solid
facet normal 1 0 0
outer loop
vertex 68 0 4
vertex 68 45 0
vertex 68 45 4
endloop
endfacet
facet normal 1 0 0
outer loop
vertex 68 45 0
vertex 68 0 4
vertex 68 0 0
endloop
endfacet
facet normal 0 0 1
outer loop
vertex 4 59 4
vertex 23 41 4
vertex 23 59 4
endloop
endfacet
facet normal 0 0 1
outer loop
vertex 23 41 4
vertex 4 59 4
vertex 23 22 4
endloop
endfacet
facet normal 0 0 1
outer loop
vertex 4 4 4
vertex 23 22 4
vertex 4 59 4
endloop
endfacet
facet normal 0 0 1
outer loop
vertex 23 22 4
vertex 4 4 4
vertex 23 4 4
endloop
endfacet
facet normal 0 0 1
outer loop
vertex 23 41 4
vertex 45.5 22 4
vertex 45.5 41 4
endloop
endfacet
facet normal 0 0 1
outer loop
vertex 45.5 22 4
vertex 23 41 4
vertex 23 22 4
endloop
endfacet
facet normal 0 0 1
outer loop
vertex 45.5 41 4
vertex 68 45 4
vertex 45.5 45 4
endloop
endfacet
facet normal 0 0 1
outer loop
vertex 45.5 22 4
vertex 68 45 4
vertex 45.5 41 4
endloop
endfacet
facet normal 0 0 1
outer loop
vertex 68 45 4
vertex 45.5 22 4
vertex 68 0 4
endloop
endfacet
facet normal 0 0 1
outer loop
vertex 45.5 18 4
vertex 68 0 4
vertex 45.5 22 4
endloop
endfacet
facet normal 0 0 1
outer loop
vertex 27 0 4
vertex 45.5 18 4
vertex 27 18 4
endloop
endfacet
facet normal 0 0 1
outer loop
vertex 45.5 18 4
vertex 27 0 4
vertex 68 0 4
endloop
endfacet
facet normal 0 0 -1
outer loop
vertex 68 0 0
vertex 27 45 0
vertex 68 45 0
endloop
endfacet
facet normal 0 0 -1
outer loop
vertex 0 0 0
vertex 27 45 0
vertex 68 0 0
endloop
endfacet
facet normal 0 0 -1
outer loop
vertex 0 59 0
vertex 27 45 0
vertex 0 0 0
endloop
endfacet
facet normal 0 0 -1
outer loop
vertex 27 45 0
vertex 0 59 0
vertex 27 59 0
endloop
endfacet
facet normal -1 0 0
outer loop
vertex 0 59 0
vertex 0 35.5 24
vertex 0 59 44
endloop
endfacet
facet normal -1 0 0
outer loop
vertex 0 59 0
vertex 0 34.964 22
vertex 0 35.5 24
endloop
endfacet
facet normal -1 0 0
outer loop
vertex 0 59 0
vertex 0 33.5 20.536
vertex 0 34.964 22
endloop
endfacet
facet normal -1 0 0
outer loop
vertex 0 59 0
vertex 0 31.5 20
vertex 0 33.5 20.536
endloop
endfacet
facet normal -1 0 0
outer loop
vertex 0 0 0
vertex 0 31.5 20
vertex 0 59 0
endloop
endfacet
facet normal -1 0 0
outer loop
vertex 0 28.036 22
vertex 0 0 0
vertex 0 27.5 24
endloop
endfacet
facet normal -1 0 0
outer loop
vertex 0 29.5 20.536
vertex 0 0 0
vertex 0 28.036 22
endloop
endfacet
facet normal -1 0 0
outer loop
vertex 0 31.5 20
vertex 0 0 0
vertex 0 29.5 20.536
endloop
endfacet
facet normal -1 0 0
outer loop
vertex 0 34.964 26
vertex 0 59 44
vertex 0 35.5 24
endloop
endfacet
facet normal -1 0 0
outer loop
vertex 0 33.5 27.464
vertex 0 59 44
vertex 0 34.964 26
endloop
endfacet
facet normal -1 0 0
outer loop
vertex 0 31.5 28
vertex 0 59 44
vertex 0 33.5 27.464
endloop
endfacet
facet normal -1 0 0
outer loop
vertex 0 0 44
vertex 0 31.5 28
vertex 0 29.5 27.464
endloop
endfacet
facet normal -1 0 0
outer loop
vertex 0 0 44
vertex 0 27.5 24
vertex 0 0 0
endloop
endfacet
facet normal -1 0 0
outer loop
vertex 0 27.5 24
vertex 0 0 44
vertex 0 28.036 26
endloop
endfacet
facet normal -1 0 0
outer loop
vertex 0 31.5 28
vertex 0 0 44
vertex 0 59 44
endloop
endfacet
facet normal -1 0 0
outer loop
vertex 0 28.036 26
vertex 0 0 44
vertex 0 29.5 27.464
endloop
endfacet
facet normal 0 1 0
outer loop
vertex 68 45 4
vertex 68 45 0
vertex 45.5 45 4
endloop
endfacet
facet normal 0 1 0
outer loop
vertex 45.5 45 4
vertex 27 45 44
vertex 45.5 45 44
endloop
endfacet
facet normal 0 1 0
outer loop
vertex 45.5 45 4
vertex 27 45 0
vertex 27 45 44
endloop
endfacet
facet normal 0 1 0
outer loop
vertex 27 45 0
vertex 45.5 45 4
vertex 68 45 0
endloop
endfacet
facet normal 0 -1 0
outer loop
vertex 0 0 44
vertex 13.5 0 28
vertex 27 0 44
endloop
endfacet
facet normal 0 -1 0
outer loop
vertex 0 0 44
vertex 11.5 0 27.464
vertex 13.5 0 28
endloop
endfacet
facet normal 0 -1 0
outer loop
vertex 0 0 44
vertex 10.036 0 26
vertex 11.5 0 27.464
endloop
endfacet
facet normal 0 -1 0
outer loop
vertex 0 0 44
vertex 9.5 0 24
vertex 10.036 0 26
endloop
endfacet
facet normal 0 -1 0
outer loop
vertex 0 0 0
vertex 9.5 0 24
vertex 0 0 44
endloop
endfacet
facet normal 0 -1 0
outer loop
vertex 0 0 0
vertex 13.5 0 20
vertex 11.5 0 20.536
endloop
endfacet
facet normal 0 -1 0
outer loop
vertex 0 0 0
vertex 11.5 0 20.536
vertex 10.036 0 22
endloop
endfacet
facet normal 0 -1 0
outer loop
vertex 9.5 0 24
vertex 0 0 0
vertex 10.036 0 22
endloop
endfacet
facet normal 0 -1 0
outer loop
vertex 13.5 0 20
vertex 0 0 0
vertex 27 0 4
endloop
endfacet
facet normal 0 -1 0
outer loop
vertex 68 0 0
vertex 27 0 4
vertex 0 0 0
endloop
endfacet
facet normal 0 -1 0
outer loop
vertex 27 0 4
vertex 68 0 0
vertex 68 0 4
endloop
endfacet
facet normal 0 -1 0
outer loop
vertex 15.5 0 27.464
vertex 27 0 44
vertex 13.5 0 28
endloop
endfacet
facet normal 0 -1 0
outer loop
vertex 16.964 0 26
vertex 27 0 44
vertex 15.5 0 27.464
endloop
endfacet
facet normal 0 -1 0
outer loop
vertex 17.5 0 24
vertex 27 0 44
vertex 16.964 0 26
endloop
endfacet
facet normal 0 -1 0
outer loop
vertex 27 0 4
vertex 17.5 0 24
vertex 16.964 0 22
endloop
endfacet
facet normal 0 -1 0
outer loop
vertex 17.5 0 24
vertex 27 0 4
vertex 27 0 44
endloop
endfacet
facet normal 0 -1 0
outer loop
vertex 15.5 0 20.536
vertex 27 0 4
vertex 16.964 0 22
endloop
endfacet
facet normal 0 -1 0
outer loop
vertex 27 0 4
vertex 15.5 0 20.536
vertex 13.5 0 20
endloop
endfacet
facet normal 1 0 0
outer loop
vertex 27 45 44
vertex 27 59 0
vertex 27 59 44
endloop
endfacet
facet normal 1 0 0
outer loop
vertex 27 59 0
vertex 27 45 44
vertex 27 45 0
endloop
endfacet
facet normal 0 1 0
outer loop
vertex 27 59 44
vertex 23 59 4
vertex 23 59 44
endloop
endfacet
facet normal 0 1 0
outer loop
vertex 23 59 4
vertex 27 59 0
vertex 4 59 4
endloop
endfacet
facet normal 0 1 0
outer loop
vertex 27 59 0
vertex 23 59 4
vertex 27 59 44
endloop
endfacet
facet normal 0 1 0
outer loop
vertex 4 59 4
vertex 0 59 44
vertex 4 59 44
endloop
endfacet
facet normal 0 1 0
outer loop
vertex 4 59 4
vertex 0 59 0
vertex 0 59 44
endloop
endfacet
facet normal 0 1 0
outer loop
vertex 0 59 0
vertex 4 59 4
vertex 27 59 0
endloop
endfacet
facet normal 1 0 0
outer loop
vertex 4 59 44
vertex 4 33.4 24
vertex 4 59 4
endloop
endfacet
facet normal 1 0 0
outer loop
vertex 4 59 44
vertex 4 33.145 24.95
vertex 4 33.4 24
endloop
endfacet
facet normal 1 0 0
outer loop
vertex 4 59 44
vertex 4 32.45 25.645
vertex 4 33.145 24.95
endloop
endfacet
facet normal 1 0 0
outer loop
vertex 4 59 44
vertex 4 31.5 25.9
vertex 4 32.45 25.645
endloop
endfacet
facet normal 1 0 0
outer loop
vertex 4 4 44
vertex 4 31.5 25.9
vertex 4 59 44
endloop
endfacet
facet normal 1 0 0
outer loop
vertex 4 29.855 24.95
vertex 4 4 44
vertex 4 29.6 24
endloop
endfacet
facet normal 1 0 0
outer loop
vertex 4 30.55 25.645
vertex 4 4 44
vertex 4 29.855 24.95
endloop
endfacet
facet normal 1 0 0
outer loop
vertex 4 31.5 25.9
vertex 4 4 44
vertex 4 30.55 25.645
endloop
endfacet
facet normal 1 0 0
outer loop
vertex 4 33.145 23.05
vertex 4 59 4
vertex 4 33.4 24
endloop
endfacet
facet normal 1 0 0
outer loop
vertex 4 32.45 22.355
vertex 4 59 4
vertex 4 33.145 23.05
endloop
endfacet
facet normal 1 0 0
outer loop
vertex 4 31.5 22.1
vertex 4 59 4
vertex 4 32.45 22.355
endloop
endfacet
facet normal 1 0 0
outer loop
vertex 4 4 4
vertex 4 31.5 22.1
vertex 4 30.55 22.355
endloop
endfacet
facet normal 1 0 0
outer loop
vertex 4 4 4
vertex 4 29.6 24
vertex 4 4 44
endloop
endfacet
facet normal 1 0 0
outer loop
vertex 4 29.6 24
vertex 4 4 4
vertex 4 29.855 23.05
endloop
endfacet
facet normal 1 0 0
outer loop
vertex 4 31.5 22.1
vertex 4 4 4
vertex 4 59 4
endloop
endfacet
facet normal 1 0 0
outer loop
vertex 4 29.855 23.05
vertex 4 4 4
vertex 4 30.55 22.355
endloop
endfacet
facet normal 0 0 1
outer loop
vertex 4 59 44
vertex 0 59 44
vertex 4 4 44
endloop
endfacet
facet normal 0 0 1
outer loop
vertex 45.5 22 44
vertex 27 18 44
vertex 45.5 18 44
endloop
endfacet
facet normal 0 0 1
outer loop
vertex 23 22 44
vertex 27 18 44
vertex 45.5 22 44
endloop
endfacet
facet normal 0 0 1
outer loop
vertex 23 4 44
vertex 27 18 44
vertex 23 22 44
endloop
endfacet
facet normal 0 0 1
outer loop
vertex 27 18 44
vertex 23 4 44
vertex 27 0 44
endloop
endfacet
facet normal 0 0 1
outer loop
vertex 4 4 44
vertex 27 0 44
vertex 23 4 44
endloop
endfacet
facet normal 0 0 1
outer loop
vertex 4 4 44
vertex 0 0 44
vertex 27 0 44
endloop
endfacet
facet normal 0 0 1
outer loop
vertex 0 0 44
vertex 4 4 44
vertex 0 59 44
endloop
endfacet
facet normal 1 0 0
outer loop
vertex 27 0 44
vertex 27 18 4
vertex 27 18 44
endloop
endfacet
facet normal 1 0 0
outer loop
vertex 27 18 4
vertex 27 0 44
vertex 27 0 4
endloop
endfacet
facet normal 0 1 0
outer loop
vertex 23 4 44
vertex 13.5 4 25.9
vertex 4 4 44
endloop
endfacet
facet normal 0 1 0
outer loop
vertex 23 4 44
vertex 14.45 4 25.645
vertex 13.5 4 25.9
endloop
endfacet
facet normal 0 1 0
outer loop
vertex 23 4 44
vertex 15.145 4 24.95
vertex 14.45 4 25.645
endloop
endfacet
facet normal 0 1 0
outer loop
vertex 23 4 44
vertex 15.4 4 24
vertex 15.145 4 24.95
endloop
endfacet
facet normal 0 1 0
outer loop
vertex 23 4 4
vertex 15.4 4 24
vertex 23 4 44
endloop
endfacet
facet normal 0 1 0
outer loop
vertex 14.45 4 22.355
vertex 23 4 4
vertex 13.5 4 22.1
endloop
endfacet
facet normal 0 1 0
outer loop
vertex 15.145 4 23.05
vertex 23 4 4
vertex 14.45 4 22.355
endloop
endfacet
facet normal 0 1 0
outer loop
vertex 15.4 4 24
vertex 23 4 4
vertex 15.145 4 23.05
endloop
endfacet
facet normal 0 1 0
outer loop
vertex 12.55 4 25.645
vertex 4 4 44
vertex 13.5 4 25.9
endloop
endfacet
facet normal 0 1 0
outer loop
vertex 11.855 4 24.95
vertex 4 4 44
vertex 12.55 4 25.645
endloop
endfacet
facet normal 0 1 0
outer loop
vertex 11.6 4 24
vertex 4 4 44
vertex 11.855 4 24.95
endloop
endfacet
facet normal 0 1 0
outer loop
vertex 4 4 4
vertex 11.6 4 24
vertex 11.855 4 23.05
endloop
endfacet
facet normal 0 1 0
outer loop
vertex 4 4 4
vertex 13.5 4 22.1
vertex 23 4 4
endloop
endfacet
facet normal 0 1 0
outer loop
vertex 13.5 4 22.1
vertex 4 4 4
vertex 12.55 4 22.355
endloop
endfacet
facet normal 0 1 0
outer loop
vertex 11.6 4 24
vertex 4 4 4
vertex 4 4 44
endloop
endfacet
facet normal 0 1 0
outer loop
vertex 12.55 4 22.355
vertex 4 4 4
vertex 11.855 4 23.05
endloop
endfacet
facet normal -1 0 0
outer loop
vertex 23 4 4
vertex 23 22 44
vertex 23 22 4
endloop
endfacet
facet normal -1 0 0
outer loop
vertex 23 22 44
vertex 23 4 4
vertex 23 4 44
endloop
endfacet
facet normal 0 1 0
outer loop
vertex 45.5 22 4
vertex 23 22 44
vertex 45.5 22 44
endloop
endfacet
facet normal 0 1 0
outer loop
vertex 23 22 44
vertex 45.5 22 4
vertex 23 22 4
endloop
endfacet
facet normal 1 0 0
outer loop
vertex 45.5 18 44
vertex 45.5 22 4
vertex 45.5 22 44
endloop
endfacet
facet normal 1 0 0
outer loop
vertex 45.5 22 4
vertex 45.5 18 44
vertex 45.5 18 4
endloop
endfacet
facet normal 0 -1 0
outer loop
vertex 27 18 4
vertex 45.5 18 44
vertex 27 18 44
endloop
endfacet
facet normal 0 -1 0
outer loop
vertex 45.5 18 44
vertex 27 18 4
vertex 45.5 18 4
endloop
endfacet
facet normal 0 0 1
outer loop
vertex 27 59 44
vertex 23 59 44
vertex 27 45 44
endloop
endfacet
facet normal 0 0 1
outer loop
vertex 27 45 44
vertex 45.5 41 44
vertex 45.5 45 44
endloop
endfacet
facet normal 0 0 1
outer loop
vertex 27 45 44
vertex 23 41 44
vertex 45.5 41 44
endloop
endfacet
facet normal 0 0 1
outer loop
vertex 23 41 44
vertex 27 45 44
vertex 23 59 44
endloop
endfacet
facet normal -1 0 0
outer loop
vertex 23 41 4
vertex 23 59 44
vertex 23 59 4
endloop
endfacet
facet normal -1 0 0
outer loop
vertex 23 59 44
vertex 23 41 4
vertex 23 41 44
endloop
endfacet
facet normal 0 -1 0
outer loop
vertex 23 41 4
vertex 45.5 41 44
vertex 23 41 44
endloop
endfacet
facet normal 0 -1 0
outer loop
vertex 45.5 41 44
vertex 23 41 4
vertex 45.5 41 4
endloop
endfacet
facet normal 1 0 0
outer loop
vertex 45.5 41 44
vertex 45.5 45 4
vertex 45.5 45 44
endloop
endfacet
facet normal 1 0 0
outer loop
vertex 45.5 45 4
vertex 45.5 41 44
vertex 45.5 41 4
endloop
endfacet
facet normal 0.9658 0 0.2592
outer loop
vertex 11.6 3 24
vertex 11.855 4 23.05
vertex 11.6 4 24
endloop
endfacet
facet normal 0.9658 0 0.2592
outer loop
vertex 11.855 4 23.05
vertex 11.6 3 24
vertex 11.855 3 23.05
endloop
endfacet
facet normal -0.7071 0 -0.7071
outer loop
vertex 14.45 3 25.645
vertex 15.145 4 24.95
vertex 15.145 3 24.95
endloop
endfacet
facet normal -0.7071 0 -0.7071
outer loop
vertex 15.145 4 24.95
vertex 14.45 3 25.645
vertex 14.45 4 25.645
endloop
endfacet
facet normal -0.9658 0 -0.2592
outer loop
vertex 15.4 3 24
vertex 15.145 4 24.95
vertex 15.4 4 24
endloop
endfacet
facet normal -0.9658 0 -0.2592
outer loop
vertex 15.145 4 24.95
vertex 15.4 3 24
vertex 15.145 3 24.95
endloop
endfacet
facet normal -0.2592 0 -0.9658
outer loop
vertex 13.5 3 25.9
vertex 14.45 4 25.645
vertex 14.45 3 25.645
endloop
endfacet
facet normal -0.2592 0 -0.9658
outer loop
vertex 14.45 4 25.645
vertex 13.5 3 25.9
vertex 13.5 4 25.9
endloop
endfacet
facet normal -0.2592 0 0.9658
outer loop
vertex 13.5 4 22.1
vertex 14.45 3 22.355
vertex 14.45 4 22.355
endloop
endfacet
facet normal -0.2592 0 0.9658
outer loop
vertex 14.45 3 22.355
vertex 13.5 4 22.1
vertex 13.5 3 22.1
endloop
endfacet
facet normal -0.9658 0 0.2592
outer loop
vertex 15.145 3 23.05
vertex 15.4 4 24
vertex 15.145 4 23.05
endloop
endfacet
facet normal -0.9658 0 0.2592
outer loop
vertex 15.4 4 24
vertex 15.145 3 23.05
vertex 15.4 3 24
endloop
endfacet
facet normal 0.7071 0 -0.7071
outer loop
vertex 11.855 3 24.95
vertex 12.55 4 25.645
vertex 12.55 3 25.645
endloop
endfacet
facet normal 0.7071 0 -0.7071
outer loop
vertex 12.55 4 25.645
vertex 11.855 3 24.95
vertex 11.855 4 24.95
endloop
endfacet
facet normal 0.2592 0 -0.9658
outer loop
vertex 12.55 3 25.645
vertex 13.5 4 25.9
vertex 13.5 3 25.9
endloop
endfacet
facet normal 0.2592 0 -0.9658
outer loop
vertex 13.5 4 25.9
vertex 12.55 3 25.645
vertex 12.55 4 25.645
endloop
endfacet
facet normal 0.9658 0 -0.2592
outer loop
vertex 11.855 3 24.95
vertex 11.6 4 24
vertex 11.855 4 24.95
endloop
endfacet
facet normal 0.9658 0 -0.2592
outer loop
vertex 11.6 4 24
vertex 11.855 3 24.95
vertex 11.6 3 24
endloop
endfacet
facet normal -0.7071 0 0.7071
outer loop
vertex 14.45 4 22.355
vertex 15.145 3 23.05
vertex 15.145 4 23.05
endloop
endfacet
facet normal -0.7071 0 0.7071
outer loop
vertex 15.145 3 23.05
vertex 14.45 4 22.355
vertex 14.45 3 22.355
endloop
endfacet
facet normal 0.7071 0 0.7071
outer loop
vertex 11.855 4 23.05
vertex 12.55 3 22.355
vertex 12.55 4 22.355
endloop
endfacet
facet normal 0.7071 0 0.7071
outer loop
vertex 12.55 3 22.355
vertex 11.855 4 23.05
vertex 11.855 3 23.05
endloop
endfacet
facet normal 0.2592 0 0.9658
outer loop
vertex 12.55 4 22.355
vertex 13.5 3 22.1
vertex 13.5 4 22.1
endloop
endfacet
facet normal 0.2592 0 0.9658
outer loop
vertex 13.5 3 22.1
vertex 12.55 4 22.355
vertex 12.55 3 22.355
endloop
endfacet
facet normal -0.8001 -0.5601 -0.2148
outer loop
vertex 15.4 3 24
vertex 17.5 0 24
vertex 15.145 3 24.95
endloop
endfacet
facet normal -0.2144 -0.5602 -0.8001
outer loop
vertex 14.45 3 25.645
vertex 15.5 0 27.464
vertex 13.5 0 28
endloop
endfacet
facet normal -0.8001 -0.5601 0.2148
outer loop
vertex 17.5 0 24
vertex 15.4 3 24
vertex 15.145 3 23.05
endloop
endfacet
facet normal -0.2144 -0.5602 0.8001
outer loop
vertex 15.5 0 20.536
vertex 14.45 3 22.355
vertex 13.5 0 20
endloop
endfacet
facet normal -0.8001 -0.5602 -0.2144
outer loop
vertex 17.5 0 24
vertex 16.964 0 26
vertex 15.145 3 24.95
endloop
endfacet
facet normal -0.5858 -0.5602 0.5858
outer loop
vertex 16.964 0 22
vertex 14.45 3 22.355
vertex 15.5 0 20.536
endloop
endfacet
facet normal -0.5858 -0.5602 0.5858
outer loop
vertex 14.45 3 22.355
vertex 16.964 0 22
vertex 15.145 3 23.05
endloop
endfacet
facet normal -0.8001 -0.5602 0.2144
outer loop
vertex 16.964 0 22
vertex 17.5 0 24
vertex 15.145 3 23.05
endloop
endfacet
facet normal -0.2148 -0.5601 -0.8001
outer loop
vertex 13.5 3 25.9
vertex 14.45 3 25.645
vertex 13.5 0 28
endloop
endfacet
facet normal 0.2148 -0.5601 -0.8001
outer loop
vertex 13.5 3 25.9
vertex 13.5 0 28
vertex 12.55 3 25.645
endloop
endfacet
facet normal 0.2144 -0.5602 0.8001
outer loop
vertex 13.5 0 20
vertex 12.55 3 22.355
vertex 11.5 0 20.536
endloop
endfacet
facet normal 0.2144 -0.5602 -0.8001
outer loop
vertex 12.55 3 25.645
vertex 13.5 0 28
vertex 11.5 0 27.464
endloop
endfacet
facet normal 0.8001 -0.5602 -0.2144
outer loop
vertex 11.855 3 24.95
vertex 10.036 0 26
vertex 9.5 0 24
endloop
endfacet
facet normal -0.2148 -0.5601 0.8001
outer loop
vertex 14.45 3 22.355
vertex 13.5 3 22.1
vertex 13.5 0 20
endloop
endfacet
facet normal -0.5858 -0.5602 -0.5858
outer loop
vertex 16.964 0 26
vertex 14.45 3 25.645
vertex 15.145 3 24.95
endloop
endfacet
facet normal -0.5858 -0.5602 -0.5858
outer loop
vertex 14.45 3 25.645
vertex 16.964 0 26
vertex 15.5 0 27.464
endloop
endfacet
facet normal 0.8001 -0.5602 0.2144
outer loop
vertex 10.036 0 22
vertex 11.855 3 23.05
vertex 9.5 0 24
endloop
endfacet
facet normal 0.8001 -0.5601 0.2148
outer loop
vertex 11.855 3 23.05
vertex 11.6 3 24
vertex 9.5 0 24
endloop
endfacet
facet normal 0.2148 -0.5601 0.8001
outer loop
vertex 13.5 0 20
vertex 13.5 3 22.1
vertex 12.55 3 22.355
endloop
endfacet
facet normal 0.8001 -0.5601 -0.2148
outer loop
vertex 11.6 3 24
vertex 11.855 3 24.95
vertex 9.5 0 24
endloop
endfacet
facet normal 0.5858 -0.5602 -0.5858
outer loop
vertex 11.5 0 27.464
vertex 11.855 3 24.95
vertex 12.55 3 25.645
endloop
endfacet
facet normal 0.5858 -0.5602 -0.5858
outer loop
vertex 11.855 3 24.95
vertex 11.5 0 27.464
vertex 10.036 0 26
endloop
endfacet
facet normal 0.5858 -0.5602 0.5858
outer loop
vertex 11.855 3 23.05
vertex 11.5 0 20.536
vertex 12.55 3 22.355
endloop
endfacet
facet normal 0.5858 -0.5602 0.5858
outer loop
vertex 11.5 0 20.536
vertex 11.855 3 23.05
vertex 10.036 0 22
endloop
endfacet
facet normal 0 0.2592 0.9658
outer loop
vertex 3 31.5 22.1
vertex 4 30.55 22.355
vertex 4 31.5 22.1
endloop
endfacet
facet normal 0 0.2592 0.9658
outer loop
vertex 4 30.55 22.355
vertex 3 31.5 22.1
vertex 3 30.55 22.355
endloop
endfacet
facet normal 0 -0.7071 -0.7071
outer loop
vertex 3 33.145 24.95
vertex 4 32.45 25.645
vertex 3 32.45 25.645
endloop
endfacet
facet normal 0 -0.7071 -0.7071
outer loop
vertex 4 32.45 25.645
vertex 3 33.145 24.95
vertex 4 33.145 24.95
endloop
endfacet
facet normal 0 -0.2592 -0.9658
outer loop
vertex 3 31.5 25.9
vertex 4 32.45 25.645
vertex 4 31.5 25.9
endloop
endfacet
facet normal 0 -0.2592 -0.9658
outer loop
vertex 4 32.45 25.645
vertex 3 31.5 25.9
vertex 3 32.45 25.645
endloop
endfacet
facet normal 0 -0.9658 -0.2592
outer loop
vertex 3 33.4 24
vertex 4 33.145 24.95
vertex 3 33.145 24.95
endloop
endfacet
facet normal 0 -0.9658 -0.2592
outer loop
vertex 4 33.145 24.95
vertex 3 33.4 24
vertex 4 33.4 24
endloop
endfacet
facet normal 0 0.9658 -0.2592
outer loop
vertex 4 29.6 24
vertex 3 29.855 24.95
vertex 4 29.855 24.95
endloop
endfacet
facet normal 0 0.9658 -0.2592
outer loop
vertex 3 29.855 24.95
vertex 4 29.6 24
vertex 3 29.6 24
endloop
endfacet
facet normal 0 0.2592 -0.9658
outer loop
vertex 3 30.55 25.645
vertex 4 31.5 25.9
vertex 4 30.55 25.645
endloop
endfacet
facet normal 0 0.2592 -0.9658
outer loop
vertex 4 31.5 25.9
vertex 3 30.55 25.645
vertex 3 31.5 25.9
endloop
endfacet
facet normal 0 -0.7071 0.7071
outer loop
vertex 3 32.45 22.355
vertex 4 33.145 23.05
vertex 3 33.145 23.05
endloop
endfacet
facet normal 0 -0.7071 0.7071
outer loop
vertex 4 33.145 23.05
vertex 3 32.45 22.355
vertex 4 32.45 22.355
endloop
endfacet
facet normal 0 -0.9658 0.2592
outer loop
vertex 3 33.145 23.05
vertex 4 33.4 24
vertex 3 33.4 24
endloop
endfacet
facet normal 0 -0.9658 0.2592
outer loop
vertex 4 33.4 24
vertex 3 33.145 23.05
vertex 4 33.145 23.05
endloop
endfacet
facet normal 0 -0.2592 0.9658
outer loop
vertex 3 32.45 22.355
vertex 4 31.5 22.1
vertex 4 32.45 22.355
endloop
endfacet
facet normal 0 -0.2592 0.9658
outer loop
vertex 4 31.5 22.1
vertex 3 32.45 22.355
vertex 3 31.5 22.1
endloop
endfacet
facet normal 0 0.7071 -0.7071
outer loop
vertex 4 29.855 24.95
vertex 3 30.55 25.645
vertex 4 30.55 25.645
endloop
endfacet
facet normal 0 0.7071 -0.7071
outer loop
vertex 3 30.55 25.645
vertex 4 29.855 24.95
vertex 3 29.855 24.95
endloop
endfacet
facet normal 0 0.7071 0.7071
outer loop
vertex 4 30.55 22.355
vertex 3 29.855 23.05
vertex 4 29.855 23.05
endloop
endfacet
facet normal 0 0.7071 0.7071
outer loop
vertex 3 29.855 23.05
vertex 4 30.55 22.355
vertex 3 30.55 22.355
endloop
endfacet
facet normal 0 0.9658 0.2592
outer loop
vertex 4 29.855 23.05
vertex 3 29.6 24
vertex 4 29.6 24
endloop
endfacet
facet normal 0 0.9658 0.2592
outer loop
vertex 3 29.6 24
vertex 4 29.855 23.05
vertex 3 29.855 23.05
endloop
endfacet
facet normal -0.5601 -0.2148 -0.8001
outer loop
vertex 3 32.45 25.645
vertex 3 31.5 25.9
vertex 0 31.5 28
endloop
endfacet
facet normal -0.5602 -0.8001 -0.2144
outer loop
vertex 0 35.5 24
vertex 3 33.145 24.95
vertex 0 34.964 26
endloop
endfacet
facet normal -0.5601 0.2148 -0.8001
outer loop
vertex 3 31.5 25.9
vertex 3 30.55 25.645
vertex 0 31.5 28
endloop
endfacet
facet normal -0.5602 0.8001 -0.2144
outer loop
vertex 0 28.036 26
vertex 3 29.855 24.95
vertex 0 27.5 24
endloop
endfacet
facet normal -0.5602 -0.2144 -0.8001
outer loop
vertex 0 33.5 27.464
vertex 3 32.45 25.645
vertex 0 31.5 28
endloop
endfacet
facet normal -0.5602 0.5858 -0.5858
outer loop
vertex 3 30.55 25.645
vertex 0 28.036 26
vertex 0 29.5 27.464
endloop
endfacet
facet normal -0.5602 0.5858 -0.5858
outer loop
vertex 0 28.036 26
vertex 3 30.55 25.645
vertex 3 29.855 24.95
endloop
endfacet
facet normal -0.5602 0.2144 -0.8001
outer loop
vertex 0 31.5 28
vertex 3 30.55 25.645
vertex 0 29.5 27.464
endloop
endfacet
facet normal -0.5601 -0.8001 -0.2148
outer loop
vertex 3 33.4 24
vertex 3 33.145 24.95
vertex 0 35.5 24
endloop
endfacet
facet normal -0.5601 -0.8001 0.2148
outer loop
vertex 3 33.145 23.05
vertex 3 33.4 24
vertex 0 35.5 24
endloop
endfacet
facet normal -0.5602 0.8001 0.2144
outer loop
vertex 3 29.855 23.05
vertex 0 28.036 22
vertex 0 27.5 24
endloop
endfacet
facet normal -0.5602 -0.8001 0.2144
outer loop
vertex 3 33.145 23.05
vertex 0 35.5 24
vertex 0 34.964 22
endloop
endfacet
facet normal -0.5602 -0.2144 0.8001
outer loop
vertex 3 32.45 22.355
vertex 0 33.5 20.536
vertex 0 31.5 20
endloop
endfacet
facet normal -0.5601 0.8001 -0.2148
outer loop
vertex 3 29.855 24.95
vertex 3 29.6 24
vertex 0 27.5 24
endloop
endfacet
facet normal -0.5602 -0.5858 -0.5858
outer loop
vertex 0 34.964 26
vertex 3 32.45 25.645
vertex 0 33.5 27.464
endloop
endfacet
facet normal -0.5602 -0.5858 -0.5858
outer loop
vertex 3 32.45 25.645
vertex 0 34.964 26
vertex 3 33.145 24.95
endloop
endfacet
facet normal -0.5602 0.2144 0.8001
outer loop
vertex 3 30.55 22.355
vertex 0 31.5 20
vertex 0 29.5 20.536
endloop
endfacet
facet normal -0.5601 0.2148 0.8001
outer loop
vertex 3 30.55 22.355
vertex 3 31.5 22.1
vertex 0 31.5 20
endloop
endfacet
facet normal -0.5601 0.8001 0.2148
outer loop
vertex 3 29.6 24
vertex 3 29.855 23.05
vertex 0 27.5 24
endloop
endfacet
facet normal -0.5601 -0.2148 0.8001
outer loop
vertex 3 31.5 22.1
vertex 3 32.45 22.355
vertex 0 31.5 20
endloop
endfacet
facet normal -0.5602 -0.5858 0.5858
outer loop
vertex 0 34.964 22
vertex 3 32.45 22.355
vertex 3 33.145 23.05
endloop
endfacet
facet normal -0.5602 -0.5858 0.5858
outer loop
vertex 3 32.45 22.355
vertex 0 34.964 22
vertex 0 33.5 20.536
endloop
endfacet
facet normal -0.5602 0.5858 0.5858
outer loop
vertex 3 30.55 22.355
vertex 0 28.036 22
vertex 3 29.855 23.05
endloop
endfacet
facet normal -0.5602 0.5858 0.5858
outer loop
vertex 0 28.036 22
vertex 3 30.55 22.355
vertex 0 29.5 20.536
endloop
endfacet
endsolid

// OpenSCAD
difference(){
	union() {
		union() {
			cube(size = [68, 45, 4]);
			cube(size = [27, 59, 4]);
		}
		translate(v = [0, 0, 4]) {
			cube(size = [4, 59, 40]);
		}
		translate(v = [0, 0, 4]) {
			cube(size = [27, 4, 40]);
		}
		translate(v = [23, 0, 4]) {
			cube(size = [4, 22, 40]);
		}
		translate(v = [23, 18, 4]) {
			cube(size = [22.5000000000, 4, 40]);
		}
		translate(v = [23, 41, 4]) {
			cube(size = [4, 18, 40]);
		}
		translate(v = [23, 41, 4]) {
			cube(size = [22.5000000000, 4, 40]);
		}
	}
	/* Holes Below*/
	union(){
		translate(v = [13.5000000000, 0, 24.0000000000]) {
			rotate(a = 90, v = [1, 0, 0]) {
				union() {
					union() {
						translate(v = [0, 0, -5]) {
							cylinder($fn = 12, h = 5, r = 1.9000000000);
						}
						translate(v = [0, 0, -3]) {
							cylinder($fn = 12, h = 3, r1 = 1.9000000000, r2 = 4);
						}
					}
					cylinder($fn = 12, h = 1, r = 4);
				}
			}
		}
		translate(v = [0, 31.5000000000, 24.0000000000]) {
			rotate(a = -90, v = [0, 1, 0]) {
				union() {
					union() {
						translate(v = [0, 0, -5]) {
							cylinder($fn = 12, h = 5, r = 1.9000000000);
						}
						translate(v = [0, 0, -3]) {
							cylinder($fn = 12, h = 3, r1 = 1.9000000000, r2 = 4);
						}
					}
					cylinder($fn = 12, h = 1, r = 4);
				}
			}
		}
	} /* End Holes */ 
}
